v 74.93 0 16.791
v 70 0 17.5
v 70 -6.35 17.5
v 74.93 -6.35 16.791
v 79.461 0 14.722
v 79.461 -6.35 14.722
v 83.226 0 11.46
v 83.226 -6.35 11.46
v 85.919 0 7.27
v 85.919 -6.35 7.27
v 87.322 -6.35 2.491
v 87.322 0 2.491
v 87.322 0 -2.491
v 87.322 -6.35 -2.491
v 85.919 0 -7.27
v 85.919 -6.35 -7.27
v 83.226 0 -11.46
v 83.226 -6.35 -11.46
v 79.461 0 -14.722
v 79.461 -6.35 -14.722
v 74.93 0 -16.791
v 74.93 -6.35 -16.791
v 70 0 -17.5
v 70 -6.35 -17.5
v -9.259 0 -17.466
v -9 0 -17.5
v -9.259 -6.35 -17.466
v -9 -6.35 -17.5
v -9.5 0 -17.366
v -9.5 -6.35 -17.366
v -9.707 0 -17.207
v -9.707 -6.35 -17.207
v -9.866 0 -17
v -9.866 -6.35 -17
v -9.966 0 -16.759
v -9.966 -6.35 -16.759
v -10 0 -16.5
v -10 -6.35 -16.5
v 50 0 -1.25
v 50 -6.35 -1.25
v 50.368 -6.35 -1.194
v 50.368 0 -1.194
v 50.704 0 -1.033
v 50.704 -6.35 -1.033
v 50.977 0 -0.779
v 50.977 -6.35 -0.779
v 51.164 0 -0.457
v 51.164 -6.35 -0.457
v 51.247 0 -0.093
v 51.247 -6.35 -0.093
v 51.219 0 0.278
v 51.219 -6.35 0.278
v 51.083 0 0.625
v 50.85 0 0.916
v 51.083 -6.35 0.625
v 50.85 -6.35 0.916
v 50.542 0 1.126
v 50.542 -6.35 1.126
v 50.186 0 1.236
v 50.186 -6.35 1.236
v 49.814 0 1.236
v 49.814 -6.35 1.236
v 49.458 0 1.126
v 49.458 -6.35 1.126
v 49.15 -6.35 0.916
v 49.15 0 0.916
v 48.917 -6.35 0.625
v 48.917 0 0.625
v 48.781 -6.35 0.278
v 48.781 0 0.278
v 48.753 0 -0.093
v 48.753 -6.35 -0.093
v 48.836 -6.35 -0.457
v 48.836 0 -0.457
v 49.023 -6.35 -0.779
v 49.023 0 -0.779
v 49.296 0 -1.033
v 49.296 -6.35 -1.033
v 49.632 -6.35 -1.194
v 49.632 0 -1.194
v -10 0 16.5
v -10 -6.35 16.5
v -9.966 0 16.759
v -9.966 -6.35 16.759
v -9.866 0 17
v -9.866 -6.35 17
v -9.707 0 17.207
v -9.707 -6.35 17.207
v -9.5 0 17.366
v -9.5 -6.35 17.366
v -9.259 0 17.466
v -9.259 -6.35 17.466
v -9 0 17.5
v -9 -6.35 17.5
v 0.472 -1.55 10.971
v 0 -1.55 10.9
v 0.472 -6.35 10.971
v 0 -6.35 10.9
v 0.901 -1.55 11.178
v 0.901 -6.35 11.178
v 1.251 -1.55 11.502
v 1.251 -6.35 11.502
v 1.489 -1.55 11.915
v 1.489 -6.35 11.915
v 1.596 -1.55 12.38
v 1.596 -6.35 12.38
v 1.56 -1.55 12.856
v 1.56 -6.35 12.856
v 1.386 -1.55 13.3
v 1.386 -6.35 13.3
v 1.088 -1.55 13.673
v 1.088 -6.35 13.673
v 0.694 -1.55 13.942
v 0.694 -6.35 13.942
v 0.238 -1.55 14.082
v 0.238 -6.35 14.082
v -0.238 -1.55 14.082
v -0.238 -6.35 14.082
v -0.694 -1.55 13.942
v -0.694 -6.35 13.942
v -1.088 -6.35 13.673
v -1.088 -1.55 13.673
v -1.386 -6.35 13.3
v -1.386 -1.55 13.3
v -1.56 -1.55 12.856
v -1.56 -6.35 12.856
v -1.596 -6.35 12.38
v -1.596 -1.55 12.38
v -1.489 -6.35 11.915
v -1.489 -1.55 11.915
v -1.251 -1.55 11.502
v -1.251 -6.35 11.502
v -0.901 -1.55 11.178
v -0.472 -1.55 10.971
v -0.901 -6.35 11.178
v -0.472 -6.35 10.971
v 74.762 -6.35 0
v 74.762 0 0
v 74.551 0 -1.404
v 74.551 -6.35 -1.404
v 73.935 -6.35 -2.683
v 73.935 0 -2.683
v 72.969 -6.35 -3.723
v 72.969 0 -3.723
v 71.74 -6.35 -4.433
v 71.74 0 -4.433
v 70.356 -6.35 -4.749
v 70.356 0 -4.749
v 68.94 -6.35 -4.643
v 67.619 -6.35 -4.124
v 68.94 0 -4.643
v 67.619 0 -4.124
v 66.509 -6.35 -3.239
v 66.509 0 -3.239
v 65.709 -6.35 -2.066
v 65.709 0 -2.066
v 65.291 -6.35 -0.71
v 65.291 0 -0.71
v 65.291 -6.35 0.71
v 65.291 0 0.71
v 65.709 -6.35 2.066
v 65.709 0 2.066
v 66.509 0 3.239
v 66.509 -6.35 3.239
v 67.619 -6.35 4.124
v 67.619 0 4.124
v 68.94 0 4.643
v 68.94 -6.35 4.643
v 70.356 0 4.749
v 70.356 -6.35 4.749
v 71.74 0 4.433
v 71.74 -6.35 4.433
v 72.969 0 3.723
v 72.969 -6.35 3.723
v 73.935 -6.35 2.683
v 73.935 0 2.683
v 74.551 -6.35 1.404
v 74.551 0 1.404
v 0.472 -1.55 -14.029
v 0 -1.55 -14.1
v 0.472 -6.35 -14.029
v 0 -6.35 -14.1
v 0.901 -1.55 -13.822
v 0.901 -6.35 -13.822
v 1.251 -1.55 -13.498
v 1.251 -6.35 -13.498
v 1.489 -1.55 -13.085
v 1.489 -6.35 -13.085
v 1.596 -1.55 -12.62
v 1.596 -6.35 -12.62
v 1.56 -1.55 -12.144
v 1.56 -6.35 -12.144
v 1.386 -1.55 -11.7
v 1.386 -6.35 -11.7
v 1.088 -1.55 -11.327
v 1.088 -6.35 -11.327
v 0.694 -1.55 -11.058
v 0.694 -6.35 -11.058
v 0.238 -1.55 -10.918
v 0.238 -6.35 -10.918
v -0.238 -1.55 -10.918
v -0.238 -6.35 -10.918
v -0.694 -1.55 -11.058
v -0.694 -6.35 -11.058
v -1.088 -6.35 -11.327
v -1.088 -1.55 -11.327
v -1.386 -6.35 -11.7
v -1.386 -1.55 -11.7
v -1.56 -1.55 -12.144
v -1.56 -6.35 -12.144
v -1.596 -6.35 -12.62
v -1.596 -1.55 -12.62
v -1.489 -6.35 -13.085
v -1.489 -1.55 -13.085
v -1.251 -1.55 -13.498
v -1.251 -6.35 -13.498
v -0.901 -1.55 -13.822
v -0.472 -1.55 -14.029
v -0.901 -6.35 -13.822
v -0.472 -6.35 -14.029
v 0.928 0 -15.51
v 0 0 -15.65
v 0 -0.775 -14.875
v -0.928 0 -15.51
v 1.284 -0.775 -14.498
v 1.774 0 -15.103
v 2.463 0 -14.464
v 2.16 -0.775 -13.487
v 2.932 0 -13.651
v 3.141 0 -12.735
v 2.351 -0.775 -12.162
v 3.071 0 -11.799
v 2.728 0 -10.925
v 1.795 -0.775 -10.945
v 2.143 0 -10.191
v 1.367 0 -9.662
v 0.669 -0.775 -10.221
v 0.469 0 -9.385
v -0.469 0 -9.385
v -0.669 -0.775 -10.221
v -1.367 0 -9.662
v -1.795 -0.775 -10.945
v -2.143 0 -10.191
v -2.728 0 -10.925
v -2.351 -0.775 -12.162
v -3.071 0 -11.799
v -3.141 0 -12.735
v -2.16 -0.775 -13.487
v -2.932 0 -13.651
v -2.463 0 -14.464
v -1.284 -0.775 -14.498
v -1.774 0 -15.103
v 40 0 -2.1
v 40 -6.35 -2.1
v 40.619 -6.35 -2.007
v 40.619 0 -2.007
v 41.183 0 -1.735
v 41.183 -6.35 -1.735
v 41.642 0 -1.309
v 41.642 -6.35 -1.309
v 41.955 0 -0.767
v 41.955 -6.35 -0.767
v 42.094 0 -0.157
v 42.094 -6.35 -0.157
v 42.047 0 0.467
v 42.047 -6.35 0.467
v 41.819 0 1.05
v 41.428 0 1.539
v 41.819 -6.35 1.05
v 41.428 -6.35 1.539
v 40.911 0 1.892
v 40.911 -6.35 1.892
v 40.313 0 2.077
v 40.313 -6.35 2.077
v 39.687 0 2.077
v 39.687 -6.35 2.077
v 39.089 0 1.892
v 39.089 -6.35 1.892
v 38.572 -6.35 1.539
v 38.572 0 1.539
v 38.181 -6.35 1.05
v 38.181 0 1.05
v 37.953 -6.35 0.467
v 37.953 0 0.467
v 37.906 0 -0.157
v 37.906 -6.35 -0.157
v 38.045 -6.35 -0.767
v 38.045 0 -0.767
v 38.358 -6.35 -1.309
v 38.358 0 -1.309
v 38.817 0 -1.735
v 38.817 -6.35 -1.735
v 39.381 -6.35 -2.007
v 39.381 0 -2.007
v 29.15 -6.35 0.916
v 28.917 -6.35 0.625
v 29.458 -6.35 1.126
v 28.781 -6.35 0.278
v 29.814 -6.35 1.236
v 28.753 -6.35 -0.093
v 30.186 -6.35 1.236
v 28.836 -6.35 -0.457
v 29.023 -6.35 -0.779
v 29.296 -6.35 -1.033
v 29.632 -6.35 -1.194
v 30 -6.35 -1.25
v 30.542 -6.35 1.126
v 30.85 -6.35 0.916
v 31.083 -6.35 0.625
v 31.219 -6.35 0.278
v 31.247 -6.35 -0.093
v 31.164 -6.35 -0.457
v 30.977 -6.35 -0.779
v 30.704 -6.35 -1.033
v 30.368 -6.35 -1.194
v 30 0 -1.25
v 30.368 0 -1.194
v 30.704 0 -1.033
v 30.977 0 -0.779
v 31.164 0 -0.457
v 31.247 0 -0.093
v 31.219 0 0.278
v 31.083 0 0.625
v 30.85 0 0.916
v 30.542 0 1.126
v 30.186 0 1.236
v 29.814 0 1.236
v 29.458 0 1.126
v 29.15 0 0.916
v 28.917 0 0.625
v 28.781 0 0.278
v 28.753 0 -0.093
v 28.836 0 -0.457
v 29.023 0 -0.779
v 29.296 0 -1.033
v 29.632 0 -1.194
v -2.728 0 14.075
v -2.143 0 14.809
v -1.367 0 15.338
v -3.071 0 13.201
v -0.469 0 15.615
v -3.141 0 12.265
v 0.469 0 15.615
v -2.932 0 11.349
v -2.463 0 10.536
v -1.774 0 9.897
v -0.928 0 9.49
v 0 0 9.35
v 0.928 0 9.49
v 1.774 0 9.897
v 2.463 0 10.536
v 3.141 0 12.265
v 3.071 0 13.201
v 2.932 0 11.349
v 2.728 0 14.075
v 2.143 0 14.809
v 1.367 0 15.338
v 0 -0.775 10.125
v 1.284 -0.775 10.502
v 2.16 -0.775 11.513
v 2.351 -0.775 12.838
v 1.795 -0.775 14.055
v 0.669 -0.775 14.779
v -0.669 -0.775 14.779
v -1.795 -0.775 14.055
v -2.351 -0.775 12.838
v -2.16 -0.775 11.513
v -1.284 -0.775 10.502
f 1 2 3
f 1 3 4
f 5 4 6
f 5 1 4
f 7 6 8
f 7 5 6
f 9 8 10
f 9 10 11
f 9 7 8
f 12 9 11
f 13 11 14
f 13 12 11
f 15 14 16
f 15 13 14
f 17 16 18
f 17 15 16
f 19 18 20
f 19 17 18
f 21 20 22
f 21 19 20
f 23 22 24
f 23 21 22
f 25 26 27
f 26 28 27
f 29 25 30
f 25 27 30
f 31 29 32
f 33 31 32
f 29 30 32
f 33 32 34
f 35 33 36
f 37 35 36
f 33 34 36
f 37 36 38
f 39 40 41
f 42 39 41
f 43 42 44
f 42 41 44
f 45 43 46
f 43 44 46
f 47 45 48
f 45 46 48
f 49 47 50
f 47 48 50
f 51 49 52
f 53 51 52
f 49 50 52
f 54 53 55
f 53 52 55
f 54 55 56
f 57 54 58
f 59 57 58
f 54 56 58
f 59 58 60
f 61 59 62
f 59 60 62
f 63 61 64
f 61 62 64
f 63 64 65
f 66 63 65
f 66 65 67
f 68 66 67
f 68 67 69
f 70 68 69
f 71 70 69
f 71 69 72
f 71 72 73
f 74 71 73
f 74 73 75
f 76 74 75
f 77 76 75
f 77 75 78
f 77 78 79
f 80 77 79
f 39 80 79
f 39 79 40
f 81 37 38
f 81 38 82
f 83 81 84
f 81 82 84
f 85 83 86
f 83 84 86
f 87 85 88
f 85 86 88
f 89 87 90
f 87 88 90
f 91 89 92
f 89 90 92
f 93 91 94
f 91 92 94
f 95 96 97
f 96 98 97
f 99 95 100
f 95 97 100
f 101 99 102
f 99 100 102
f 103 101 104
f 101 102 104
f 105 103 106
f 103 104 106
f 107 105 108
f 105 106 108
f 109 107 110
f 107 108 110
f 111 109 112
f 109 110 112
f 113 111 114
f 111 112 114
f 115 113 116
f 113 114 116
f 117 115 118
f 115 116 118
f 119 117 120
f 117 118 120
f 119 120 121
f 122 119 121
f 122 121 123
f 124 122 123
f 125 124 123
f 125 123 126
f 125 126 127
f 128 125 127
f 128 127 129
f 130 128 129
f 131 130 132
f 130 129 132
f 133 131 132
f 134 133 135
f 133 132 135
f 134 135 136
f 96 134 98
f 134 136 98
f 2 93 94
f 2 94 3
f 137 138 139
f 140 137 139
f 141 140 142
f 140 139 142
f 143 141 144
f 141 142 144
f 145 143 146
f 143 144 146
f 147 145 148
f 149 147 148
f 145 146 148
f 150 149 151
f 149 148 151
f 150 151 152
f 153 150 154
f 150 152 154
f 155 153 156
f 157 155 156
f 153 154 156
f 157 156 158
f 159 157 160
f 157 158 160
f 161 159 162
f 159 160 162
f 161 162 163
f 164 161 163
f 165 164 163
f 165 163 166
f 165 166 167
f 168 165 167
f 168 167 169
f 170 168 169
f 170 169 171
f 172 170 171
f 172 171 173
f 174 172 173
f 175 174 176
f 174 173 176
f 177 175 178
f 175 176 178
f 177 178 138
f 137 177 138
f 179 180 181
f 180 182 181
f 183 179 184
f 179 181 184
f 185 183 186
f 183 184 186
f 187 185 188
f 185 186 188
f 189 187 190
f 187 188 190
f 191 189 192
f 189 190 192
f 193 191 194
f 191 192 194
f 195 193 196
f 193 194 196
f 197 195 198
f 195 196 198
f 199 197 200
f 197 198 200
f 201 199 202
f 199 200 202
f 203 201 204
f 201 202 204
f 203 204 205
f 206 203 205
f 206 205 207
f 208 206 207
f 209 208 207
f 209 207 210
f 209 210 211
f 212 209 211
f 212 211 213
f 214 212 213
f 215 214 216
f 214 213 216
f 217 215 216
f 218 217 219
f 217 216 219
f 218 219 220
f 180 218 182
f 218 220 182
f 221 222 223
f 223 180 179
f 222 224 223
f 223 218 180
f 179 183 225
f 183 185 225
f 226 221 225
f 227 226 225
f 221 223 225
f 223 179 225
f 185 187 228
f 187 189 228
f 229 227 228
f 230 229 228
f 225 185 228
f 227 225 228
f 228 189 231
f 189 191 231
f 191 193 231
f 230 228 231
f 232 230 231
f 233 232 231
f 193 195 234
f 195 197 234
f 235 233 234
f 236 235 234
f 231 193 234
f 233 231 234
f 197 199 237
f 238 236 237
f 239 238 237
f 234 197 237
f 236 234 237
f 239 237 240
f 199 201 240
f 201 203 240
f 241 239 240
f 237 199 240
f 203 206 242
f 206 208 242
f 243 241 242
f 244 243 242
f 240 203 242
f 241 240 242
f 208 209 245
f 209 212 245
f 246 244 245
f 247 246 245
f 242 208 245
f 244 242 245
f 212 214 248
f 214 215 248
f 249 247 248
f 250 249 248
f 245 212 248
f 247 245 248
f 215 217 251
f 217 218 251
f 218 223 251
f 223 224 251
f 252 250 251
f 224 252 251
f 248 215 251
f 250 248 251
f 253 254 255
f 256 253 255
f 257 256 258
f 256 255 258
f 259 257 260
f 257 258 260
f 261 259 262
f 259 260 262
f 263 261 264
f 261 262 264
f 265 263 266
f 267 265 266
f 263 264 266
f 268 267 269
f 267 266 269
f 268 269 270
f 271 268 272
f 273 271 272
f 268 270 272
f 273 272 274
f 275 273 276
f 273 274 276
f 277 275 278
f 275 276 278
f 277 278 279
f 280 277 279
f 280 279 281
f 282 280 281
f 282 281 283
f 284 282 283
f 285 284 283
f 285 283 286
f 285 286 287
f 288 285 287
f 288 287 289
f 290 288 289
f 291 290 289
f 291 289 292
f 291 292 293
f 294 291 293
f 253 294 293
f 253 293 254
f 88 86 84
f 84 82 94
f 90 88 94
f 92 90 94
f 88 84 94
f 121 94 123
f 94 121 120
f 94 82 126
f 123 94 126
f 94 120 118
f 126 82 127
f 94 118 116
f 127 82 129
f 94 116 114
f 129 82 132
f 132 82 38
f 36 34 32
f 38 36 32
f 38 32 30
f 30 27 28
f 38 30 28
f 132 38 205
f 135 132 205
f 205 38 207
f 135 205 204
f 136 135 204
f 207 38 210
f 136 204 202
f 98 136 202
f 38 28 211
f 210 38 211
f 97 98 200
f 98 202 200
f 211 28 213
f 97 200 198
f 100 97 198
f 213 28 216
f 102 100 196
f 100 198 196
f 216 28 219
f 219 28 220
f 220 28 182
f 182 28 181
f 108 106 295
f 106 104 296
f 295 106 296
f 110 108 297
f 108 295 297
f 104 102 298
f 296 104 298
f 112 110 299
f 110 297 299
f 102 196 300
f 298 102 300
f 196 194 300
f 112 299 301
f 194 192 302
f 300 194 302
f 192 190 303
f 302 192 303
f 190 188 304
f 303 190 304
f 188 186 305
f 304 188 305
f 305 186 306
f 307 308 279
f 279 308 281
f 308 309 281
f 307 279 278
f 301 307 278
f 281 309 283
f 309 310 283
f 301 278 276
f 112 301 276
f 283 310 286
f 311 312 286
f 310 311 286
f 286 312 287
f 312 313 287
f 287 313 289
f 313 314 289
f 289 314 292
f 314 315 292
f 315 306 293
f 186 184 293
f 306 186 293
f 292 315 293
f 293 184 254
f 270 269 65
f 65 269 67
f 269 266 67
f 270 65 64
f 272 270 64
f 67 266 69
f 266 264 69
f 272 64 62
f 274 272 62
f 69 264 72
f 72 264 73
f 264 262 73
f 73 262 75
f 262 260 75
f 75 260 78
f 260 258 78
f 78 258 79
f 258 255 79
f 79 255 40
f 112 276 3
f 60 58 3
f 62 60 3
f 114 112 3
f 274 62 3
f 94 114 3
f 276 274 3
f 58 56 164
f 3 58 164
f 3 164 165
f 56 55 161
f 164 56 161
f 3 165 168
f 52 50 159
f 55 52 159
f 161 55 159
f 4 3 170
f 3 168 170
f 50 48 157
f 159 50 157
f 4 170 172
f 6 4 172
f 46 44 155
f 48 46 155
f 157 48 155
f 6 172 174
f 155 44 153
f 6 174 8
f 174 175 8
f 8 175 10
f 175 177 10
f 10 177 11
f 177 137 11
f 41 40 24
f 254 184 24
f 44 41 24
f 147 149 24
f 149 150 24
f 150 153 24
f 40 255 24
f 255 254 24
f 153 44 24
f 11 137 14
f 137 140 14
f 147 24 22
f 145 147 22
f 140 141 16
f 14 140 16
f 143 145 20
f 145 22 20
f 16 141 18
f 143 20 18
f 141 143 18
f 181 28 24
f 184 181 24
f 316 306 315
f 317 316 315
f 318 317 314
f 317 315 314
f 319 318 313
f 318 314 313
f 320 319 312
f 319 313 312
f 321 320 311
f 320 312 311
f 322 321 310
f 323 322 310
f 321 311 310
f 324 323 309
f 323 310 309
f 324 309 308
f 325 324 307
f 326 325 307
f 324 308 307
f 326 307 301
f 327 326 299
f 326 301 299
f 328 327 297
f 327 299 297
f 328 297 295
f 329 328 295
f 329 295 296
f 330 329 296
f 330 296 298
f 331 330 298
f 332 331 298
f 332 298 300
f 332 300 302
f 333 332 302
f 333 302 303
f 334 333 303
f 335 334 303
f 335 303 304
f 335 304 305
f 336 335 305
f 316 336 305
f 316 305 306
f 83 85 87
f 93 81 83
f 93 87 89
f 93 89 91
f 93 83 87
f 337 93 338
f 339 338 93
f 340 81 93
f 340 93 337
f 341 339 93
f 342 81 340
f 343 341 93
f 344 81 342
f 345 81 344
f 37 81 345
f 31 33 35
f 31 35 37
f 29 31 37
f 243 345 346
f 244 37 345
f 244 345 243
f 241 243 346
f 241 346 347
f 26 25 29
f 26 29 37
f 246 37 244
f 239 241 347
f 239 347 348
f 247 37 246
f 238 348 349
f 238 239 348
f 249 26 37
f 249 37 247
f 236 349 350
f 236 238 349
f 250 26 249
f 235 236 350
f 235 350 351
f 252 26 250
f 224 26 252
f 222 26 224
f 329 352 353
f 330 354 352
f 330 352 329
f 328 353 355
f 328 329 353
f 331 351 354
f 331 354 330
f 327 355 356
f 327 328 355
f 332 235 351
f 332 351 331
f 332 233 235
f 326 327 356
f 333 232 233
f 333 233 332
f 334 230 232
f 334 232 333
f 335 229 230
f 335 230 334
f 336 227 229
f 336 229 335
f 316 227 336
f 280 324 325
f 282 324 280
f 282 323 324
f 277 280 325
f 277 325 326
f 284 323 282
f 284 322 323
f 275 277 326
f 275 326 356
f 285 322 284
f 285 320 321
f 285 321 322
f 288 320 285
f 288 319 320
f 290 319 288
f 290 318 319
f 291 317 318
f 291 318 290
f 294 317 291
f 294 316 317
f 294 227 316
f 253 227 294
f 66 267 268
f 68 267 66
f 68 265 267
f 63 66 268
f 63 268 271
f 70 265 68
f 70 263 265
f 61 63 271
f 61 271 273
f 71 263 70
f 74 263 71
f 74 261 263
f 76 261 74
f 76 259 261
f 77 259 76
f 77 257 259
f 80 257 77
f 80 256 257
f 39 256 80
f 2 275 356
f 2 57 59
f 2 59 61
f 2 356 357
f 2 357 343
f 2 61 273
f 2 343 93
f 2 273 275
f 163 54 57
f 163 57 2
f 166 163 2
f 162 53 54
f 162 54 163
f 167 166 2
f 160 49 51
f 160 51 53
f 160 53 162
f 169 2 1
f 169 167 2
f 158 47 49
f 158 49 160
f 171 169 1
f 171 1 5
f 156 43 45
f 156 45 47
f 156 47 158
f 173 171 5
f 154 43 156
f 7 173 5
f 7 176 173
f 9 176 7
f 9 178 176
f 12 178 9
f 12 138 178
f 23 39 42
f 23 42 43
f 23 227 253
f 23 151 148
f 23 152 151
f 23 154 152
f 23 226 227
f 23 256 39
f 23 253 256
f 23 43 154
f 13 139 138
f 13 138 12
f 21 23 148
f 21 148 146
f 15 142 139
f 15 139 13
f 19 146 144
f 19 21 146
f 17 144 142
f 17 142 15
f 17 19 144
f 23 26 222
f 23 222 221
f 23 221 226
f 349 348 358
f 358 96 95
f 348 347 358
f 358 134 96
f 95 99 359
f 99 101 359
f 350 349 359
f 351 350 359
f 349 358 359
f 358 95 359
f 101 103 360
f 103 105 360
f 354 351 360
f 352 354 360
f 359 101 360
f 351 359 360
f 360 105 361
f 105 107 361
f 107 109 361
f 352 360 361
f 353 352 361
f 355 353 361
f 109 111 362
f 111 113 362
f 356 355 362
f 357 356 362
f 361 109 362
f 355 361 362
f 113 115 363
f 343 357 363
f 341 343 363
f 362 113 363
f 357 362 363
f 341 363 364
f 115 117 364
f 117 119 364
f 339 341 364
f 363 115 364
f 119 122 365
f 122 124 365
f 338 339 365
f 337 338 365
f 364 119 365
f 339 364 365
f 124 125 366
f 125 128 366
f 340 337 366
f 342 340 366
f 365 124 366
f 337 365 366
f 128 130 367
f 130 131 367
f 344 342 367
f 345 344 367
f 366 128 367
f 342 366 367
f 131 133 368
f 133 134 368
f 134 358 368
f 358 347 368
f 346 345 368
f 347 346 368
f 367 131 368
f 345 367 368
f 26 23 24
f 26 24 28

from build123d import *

# Parameters (mm, degrees)
SKETCH2_R                                       = 4.7625
BOSS_EXTRUDE1_DEPTH                             = 6.35
CSK_FOR_M3_FLAT_HEAD_MACHINE_SCREW1_D           = 3.2
CSK_FOR_M3_FLAT_HEAD_MACHINE_SCREW1_CSINK_D     = 6.3
CSK_FOR_M3_FLAT_HEAD_MACHINE_SCREW1_CSINK_ANGLE = 90
TAP_DRILL_FOR_M3X0_5_TAP1_D                     = 2.5
FILLET1_R                                       = 1
TAP_DRILL_FOR_M5X0_8_TAP1_D                     = 4.2


with BuildPart() as part:
    # Sketch2 → Boss-Extrude1 (new body)
    with BuildSketch(Plane(origin=(0, 0, 0), x_dir=(1, 0, 0), z_dir=(0, 1, 0))):
        with BuildLine():
            Line((70, 17.5), (-10, 17.5))
            Line((-10, 17.5), (-10, -17.5))
            Line((-10, -17.5), (70, -17.5))
            ThreePointArc((70, -17.5), (87.5, 0), (70, 17.5))
        make_face()
        with Locations((70, 0)):
            Circle(SKETCH2_R, mode=Mode.SUBTRACT)
    extrude(amount=-BOSS_EXTRUDE1_DEPTH)

    # CSK for M3 Flat Head Machine Screw1 (through all)
    with Locations(Plane(origin=(0, 0, -12.5), x_dir=(0, 0, 1), z_dir=(0, 1, 0))):
        with Locations((0, 0), (25, 0)):
            CounterSinkHole(CSK_FOR_M3_FLAT_HEAD_MACHINE_SCREW1_D / 2, CSK_FOR_M3_FLAT_HEAD_MACHINE_SCREW1_CSINK_D / 2, counter_sink_angle=CSK_FOR_M3_FLAT_HEAD_MACHINE_SCREW1_CSINK_ANGLE)

    # Tap Drill for M3x0.5 Tap1 (through all)
    with Locations(Plane(origin=(30, 0, 0), x_dir=(0, 0, 1), z_dir=(0, 1, 0))):
        with Locations((0, 0), (0, 20)):
            Hole(TAP_DRILL_FOR_M3X0_5_TAP1_D / 2)

    # Fillet1
    fillet1_edges = [part.edges().sort_by_distance(p)[0] for p in [
        (-10, -3.175, 17.5),
        (-10, -3.175, -17.5),
    ]]
    fillet(fillet1_edges, radius=FILLET1_R)

    # Tap Drill for M5x0.8 Tap1 (through all)
    with Locations(Plane(origin=(40, 0, 0), x_dir=(0, 0, 1), z_dir=(0, 1, 0))):
        with Locations((0, 0)):
            Hole(TAP_DRILL_FOR_M5X0_8_TAP1_D / 2)


solid = part.part
